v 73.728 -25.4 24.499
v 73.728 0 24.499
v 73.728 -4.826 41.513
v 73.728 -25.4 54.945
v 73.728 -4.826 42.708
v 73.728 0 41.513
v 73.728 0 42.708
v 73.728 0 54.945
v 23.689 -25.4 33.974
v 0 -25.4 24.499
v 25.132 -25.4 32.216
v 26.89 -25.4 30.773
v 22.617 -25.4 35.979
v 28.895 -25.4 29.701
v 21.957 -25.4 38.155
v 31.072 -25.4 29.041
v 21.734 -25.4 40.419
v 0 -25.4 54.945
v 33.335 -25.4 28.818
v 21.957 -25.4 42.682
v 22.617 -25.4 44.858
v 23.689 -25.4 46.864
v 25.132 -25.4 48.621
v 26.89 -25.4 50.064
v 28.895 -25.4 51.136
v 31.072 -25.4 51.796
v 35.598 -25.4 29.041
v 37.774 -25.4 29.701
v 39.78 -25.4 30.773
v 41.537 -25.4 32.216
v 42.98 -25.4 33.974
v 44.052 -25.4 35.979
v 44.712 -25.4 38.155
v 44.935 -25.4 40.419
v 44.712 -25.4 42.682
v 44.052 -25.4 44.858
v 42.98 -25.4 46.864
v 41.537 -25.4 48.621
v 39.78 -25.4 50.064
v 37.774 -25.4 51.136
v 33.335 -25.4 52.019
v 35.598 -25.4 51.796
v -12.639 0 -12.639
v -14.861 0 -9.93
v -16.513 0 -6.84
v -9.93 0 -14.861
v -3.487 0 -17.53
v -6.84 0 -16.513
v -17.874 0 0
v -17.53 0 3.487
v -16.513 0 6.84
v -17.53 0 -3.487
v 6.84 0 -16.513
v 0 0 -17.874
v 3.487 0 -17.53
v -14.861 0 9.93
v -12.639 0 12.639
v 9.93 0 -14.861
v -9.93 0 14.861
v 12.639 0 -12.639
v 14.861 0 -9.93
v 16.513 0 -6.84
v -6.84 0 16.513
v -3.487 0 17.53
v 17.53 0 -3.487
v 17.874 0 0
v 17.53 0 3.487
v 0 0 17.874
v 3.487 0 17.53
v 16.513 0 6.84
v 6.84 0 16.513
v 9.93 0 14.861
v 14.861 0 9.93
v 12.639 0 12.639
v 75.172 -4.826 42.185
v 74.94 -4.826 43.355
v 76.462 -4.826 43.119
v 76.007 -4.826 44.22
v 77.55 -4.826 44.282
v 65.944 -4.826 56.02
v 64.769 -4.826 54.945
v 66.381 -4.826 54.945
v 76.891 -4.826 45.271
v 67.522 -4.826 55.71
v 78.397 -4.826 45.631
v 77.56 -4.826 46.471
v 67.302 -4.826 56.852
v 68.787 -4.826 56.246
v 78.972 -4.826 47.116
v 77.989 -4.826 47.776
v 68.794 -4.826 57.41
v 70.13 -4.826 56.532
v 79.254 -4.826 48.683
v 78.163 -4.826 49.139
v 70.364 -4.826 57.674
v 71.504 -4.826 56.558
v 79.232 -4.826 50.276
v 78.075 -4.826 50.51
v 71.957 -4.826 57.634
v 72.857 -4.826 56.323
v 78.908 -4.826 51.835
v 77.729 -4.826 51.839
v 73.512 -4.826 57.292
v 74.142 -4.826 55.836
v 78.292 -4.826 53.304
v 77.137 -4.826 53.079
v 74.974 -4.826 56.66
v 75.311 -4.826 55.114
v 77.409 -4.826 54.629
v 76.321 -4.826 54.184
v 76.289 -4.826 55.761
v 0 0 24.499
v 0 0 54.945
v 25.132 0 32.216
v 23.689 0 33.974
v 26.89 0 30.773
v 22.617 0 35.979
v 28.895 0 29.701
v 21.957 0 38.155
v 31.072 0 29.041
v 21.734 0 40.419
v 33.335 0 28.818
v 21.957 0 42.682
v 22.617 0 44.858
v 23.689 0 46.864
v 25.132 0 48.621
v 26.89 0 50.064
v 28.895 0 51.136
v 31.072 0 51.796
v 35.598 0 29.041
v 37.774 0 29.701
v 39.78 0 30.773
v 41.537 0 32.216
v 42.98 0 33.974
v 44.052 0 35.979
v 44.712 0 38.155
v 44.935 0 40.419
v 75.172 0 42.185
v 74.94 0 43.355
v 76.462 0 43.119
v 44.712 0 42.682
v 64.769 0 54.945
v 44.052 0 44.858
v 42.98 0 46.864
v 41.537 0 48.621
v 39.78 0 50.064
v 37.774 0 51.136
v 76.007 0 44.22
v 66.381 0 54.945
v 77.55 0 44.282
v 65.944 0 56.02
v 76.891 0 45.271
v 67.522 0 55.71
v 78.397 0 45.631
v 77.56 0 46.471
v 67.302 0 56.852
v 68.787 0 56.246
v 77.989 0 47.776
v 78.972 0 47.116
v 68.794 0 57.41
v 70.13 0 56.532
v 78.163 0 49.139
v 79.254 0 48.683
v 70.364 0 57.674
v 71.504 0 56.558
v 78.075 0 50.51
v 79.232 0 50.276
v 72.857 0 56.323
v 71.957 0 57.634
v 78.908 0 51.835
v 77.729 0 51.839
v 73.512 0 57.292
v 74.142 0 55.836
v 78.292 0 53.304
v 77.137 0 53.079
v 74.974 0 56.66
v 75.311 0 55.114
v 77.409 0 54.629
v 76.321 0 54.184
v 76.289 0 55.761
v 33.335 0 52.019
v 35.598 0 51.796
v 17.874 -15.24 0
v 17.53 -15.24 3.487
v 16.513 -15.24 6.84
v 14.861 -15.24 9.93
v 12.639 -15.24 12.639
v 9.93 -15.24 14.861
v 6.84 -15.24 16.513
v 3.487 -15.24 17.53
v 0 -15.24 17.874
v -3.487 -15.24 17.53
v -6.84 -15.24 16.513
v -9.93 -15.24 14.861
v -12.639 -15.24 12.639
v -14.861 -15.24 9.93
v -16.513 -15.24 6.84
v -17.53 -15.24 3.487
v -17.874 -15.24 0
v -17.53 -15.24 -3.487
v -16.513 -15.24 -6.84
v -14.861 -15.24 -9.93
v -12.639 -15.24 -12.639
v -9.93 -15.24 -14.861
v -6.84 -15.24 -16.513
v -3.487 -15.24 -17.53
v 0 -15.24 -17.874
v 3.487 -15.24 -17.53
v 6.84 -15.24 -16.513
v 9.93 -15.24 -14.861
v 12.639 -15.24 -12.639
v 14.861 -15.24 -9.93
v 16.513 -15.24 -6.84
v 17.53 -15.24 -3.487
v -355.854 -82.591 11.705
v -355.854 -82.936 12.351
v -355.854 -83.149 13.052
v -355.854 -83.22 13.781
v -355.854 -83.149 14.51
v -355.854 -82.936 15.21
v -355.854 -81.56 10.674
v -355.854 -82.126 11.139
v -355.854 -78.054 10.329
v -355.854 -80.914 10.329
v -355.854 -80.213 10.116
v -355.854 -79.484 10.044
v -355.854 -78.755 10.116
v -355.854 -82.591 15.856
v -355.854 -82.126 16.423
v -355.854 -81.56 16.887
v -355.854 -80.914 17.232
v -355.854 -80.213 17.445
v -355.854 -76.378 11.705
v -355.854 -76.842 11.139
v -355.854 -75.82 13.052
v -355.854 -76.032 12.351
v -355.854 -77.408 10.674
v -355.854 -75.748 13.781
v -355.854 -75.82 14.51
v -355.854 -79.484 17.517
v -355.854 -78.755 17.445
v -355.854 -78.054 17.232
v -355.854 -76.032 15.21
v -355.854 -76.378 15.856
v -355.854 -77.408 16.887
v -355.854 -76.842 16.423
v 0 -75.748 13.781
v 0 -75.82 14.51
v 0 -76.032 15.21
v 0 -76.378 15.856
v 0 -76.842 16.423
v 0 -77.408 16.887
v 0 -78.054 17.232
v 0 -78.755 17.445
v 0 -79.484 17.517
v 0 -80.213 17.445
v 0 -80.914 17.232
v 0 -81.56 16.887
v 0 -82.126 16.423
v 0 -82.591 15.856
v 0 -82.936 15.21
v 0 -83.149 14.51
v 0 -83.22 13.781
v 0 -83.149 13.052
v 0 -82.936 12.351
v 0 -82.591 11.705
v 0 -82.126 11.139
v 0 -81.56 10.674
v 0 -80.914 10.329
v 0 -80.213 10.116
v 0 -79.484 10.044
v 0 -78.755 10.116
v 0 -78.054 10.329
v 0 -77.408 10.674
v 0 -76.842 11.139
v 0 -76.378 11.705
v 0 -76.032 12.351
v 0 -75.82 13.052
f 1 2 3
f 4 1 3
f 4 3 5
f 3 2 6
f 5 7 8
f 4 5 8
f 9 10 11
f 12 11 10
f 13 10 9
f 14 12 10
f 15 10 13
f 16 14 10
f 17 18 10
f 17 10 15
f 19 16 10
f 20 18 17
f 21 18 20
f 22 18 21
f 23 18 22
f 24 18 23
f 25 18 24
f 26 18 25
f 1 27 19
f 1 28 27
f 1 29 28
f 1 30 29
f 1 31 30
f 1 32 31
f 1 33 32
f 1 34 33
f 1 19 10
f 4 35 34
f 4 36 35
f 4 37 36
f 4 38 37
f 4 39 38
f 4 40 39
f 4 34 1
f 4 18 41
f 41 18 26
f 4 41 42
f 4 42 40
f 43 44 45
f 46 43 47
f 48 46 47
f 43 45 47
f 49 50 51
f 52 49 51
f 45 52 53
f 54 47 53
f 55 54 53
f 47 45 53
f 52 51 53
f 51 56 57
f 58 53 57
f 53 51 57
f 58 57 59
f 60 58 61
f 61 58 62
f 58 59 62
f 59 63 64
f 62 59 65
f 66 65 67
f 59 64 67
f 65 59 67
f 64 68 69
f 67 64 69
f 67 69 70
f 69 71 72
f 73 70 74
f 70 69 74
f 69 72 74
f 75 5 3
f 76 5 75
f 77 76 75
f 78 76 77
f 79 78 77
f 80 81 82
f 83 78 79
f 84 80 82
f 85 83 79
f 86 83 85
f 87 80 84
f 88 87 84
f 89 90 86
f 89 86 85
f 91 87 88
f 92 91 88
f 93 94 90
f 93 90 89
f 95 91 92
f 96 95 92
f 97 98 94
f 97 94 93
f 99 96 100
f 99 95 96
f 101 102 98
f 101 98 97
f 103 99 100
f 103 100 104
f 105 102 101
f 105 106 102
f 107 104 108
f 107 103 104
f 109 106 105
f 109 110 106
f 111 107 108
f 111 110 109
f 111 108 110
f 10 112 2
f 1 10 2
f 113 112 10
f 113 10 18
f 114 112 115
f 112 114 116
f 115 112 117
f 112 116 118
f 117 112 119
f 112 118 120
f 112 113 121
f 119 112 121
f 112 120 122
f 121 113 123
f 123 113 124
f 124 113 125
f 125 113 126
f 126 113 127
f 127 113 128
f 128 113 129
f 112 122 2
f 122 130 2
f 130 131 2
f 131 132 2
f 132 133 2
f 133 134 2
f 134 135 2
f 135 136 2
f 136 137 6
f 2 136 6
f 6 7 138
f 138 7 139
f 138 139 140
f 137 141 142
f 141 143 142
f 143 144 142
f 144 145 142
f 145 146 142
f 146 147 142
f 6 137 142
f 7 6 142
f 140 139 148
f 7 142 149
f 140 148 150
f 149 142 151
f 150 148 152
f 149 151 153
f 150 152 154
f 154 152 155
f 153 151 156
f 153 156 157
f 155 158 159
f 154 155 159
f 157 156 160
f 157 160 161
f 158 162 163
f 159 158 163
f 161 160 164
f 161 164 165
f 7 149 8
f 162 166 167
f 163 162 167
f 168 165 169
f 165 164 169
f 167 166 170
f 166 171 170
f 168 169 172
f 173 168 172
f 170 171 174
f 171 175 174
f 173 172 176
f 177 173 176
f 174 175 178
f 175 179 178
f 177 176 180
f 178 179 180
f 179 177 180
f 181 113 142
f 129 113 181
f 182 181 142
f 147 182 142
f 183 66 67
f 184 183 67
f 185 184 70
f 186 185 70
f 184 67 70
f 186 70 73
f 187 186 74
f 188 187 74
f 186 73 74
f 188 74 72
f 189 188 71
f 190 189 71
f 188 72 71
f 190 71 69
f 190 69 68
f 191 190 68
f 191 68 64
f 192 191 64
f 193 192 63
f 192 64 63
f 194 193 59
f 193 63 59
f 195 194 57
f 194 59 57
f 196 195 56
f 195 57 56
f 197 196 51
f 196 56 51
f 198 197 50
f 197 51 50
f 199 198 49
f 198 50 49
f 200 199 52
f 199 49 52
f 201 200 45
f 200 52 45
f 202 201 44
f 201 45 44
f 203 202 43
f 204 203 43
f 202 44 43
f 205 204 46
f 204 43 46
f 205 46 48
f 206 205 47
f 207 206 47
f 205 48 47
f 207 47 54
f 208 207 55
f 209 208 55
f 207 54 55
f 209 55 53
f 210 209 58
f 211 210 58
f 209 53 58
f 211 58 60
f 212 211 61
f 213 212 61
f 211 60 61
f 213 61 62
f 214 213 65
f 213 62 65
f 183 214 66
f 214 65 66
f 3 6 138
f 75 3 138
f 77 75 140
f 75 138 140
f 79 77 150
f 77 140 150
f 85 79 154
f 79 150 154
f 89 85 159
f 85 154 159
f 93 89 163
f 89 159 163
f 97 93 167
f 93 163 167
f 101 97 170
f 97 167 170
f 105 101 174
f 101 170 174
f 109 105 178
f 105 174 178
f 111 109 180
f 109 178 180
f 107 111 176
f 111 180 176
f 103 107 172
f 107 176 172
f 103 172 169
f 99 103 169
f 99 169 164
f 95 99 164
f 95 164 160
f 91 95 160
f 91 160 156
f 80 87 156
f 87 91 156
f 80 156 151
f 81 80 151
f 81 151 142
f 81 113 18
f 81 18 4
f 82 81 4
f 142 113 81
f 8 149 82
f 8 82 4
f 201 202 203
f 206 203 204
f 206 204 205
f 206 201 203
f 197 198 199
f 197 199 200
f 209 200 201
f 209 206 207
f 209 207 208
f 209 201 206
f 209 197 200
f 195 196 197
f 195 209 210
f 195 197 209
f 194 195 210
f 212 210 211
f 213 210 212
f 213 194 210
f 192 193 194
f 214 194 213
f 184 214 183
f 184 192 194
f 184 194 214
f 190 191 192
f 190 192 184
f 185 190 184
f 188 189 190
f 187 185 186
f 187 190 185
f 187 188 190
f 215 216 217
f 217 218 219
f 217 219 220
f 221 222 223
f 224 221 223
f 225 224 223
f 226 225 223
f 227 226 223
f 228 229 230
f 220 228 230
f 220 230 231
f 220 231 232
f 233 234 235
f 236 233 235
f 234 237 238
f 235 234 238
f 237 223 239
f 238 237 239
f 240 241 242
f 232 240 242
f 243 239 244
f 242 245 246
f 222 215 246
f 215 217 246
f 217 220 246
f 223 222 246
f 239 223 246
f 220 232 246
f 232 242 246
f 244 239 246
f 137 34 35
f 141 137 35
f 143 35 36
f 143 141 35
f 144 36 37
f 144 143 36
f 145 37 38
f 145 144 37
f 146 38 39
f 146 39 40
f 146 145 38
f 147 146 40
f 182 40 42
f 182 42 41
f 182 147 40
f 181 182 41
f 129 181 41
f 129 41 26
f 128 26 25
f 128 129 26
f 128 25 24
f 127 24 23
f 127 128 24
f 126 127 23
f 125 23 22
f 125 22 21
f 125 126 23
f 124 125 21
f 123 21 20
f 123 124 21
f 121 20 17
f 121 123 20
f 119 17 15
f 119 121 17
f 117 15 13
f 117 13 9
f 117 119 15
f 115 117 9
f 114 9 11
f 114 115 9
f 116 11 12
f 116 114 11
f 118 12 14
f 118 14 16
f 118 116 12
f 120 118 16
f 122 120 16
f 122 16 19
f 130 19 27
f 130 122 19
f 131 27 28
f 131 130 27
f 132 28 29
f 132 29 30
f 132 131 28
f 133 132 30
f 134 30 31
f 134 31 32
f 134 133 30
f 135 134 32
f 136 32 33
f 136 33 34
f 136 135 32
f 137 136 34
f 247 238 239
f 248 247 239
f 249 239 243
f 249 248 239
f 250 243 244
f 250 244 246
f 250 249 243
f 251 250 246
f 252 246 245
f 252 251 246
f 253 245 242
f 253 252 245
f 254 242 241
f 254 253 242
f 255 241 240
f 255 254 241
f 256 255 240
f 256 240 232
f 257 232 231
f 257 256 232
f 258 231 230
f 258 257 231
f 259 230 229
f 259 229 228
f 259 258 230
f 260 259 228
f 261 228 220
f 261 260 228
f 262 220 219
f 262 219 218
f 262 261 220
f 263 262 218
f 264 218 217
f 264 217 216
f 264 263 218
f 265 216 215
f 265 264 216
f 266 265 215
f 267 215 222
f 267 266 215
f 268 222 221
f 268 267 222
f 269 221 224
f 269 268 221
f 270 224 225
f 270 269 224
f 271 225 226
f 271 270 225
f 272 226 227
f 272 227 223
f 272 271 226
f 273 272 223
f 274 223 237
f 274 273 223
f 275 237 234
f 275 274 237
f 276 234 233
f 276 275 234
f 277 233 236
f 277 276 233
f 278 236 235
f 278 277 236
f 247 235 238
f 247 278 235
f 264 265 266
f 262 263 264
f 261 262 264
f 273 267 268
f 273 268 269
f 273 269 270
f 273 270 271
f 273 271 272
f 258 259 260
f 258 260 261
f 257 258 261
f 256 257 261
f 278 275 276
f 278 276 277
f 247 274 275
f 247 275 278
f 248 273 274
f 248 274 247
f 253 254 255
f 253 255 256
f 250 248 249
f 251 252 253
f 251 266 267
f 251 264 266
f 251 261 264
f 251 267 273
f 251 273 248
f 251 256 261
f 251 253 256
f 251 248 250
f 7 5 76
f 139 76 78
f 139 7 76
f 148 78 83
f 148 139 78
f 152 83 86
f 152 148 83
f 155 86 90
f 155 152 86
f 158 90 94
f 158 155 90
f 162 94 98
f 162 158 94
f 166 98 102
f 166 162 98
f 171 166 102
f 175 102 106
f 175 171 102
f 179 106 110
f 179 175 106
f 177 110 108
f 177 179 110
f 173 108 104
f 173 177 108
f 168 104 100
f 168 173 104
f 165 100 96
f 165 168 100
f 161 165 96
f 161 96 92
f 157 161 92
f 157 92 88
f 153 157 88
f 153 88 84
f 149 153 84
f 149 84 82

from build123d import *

# Parameters (mm, degrees)
F0_R     = 3.736256
F1_DEPTH = 355.854
F2_R     = 8.328542
F2_R_2   = 7.212929
F3_DEPTH = 4.826
F4_W     = 73.727727
F4_H     = 30.445471
F4_R     = 11.600518
F5_DEPTH = 25.4
F6_R     = 17.87369
F7_DEPTH = 15.24


with BuildPart() as f1:
    # F0 (on Right) → F1 (new body)
    with BuildSketch(Plane.YZ):
        with Locations((-79.484217, 13.780644)):
            Circle(F0_R)
    extrude(amount=-F1_DEPTH)


with BuildPart() as f3:
    # F2 (on Front) → F3 (new body)
    with BuildSketch(Plane.XZ):
        with Locations((70.953369, 49.366172)):
            Circle(F2_R)
        with Locations((70.953369, 49.366172)):
            Circle(F2_R_2, mode=Mode.SUBTRACT)
    extrude(amount=F3_DEPTH)

    # F4 (on Front) → F5 (join)
    with BuildSketch(Plane.XZ):
        with Locations((36.863864, 39.72197)):
            Rectangle(F4_W, F4_H)
        with Locations((33.33465, 40.418629)):
            Circle(F4_R, mode=Mode.SUBTRACT)
    extrude(amount=F5_DEPTH)


with BuildPart() as f7:
    # F6 (on Front) → F7 (new body)
    with BuildSketch(Plane.XZ):
        Circle(F6_R)
    extrude(amount=F7_DEPTH)


solid = Compound([f1.part, f3.part, f7.part])
